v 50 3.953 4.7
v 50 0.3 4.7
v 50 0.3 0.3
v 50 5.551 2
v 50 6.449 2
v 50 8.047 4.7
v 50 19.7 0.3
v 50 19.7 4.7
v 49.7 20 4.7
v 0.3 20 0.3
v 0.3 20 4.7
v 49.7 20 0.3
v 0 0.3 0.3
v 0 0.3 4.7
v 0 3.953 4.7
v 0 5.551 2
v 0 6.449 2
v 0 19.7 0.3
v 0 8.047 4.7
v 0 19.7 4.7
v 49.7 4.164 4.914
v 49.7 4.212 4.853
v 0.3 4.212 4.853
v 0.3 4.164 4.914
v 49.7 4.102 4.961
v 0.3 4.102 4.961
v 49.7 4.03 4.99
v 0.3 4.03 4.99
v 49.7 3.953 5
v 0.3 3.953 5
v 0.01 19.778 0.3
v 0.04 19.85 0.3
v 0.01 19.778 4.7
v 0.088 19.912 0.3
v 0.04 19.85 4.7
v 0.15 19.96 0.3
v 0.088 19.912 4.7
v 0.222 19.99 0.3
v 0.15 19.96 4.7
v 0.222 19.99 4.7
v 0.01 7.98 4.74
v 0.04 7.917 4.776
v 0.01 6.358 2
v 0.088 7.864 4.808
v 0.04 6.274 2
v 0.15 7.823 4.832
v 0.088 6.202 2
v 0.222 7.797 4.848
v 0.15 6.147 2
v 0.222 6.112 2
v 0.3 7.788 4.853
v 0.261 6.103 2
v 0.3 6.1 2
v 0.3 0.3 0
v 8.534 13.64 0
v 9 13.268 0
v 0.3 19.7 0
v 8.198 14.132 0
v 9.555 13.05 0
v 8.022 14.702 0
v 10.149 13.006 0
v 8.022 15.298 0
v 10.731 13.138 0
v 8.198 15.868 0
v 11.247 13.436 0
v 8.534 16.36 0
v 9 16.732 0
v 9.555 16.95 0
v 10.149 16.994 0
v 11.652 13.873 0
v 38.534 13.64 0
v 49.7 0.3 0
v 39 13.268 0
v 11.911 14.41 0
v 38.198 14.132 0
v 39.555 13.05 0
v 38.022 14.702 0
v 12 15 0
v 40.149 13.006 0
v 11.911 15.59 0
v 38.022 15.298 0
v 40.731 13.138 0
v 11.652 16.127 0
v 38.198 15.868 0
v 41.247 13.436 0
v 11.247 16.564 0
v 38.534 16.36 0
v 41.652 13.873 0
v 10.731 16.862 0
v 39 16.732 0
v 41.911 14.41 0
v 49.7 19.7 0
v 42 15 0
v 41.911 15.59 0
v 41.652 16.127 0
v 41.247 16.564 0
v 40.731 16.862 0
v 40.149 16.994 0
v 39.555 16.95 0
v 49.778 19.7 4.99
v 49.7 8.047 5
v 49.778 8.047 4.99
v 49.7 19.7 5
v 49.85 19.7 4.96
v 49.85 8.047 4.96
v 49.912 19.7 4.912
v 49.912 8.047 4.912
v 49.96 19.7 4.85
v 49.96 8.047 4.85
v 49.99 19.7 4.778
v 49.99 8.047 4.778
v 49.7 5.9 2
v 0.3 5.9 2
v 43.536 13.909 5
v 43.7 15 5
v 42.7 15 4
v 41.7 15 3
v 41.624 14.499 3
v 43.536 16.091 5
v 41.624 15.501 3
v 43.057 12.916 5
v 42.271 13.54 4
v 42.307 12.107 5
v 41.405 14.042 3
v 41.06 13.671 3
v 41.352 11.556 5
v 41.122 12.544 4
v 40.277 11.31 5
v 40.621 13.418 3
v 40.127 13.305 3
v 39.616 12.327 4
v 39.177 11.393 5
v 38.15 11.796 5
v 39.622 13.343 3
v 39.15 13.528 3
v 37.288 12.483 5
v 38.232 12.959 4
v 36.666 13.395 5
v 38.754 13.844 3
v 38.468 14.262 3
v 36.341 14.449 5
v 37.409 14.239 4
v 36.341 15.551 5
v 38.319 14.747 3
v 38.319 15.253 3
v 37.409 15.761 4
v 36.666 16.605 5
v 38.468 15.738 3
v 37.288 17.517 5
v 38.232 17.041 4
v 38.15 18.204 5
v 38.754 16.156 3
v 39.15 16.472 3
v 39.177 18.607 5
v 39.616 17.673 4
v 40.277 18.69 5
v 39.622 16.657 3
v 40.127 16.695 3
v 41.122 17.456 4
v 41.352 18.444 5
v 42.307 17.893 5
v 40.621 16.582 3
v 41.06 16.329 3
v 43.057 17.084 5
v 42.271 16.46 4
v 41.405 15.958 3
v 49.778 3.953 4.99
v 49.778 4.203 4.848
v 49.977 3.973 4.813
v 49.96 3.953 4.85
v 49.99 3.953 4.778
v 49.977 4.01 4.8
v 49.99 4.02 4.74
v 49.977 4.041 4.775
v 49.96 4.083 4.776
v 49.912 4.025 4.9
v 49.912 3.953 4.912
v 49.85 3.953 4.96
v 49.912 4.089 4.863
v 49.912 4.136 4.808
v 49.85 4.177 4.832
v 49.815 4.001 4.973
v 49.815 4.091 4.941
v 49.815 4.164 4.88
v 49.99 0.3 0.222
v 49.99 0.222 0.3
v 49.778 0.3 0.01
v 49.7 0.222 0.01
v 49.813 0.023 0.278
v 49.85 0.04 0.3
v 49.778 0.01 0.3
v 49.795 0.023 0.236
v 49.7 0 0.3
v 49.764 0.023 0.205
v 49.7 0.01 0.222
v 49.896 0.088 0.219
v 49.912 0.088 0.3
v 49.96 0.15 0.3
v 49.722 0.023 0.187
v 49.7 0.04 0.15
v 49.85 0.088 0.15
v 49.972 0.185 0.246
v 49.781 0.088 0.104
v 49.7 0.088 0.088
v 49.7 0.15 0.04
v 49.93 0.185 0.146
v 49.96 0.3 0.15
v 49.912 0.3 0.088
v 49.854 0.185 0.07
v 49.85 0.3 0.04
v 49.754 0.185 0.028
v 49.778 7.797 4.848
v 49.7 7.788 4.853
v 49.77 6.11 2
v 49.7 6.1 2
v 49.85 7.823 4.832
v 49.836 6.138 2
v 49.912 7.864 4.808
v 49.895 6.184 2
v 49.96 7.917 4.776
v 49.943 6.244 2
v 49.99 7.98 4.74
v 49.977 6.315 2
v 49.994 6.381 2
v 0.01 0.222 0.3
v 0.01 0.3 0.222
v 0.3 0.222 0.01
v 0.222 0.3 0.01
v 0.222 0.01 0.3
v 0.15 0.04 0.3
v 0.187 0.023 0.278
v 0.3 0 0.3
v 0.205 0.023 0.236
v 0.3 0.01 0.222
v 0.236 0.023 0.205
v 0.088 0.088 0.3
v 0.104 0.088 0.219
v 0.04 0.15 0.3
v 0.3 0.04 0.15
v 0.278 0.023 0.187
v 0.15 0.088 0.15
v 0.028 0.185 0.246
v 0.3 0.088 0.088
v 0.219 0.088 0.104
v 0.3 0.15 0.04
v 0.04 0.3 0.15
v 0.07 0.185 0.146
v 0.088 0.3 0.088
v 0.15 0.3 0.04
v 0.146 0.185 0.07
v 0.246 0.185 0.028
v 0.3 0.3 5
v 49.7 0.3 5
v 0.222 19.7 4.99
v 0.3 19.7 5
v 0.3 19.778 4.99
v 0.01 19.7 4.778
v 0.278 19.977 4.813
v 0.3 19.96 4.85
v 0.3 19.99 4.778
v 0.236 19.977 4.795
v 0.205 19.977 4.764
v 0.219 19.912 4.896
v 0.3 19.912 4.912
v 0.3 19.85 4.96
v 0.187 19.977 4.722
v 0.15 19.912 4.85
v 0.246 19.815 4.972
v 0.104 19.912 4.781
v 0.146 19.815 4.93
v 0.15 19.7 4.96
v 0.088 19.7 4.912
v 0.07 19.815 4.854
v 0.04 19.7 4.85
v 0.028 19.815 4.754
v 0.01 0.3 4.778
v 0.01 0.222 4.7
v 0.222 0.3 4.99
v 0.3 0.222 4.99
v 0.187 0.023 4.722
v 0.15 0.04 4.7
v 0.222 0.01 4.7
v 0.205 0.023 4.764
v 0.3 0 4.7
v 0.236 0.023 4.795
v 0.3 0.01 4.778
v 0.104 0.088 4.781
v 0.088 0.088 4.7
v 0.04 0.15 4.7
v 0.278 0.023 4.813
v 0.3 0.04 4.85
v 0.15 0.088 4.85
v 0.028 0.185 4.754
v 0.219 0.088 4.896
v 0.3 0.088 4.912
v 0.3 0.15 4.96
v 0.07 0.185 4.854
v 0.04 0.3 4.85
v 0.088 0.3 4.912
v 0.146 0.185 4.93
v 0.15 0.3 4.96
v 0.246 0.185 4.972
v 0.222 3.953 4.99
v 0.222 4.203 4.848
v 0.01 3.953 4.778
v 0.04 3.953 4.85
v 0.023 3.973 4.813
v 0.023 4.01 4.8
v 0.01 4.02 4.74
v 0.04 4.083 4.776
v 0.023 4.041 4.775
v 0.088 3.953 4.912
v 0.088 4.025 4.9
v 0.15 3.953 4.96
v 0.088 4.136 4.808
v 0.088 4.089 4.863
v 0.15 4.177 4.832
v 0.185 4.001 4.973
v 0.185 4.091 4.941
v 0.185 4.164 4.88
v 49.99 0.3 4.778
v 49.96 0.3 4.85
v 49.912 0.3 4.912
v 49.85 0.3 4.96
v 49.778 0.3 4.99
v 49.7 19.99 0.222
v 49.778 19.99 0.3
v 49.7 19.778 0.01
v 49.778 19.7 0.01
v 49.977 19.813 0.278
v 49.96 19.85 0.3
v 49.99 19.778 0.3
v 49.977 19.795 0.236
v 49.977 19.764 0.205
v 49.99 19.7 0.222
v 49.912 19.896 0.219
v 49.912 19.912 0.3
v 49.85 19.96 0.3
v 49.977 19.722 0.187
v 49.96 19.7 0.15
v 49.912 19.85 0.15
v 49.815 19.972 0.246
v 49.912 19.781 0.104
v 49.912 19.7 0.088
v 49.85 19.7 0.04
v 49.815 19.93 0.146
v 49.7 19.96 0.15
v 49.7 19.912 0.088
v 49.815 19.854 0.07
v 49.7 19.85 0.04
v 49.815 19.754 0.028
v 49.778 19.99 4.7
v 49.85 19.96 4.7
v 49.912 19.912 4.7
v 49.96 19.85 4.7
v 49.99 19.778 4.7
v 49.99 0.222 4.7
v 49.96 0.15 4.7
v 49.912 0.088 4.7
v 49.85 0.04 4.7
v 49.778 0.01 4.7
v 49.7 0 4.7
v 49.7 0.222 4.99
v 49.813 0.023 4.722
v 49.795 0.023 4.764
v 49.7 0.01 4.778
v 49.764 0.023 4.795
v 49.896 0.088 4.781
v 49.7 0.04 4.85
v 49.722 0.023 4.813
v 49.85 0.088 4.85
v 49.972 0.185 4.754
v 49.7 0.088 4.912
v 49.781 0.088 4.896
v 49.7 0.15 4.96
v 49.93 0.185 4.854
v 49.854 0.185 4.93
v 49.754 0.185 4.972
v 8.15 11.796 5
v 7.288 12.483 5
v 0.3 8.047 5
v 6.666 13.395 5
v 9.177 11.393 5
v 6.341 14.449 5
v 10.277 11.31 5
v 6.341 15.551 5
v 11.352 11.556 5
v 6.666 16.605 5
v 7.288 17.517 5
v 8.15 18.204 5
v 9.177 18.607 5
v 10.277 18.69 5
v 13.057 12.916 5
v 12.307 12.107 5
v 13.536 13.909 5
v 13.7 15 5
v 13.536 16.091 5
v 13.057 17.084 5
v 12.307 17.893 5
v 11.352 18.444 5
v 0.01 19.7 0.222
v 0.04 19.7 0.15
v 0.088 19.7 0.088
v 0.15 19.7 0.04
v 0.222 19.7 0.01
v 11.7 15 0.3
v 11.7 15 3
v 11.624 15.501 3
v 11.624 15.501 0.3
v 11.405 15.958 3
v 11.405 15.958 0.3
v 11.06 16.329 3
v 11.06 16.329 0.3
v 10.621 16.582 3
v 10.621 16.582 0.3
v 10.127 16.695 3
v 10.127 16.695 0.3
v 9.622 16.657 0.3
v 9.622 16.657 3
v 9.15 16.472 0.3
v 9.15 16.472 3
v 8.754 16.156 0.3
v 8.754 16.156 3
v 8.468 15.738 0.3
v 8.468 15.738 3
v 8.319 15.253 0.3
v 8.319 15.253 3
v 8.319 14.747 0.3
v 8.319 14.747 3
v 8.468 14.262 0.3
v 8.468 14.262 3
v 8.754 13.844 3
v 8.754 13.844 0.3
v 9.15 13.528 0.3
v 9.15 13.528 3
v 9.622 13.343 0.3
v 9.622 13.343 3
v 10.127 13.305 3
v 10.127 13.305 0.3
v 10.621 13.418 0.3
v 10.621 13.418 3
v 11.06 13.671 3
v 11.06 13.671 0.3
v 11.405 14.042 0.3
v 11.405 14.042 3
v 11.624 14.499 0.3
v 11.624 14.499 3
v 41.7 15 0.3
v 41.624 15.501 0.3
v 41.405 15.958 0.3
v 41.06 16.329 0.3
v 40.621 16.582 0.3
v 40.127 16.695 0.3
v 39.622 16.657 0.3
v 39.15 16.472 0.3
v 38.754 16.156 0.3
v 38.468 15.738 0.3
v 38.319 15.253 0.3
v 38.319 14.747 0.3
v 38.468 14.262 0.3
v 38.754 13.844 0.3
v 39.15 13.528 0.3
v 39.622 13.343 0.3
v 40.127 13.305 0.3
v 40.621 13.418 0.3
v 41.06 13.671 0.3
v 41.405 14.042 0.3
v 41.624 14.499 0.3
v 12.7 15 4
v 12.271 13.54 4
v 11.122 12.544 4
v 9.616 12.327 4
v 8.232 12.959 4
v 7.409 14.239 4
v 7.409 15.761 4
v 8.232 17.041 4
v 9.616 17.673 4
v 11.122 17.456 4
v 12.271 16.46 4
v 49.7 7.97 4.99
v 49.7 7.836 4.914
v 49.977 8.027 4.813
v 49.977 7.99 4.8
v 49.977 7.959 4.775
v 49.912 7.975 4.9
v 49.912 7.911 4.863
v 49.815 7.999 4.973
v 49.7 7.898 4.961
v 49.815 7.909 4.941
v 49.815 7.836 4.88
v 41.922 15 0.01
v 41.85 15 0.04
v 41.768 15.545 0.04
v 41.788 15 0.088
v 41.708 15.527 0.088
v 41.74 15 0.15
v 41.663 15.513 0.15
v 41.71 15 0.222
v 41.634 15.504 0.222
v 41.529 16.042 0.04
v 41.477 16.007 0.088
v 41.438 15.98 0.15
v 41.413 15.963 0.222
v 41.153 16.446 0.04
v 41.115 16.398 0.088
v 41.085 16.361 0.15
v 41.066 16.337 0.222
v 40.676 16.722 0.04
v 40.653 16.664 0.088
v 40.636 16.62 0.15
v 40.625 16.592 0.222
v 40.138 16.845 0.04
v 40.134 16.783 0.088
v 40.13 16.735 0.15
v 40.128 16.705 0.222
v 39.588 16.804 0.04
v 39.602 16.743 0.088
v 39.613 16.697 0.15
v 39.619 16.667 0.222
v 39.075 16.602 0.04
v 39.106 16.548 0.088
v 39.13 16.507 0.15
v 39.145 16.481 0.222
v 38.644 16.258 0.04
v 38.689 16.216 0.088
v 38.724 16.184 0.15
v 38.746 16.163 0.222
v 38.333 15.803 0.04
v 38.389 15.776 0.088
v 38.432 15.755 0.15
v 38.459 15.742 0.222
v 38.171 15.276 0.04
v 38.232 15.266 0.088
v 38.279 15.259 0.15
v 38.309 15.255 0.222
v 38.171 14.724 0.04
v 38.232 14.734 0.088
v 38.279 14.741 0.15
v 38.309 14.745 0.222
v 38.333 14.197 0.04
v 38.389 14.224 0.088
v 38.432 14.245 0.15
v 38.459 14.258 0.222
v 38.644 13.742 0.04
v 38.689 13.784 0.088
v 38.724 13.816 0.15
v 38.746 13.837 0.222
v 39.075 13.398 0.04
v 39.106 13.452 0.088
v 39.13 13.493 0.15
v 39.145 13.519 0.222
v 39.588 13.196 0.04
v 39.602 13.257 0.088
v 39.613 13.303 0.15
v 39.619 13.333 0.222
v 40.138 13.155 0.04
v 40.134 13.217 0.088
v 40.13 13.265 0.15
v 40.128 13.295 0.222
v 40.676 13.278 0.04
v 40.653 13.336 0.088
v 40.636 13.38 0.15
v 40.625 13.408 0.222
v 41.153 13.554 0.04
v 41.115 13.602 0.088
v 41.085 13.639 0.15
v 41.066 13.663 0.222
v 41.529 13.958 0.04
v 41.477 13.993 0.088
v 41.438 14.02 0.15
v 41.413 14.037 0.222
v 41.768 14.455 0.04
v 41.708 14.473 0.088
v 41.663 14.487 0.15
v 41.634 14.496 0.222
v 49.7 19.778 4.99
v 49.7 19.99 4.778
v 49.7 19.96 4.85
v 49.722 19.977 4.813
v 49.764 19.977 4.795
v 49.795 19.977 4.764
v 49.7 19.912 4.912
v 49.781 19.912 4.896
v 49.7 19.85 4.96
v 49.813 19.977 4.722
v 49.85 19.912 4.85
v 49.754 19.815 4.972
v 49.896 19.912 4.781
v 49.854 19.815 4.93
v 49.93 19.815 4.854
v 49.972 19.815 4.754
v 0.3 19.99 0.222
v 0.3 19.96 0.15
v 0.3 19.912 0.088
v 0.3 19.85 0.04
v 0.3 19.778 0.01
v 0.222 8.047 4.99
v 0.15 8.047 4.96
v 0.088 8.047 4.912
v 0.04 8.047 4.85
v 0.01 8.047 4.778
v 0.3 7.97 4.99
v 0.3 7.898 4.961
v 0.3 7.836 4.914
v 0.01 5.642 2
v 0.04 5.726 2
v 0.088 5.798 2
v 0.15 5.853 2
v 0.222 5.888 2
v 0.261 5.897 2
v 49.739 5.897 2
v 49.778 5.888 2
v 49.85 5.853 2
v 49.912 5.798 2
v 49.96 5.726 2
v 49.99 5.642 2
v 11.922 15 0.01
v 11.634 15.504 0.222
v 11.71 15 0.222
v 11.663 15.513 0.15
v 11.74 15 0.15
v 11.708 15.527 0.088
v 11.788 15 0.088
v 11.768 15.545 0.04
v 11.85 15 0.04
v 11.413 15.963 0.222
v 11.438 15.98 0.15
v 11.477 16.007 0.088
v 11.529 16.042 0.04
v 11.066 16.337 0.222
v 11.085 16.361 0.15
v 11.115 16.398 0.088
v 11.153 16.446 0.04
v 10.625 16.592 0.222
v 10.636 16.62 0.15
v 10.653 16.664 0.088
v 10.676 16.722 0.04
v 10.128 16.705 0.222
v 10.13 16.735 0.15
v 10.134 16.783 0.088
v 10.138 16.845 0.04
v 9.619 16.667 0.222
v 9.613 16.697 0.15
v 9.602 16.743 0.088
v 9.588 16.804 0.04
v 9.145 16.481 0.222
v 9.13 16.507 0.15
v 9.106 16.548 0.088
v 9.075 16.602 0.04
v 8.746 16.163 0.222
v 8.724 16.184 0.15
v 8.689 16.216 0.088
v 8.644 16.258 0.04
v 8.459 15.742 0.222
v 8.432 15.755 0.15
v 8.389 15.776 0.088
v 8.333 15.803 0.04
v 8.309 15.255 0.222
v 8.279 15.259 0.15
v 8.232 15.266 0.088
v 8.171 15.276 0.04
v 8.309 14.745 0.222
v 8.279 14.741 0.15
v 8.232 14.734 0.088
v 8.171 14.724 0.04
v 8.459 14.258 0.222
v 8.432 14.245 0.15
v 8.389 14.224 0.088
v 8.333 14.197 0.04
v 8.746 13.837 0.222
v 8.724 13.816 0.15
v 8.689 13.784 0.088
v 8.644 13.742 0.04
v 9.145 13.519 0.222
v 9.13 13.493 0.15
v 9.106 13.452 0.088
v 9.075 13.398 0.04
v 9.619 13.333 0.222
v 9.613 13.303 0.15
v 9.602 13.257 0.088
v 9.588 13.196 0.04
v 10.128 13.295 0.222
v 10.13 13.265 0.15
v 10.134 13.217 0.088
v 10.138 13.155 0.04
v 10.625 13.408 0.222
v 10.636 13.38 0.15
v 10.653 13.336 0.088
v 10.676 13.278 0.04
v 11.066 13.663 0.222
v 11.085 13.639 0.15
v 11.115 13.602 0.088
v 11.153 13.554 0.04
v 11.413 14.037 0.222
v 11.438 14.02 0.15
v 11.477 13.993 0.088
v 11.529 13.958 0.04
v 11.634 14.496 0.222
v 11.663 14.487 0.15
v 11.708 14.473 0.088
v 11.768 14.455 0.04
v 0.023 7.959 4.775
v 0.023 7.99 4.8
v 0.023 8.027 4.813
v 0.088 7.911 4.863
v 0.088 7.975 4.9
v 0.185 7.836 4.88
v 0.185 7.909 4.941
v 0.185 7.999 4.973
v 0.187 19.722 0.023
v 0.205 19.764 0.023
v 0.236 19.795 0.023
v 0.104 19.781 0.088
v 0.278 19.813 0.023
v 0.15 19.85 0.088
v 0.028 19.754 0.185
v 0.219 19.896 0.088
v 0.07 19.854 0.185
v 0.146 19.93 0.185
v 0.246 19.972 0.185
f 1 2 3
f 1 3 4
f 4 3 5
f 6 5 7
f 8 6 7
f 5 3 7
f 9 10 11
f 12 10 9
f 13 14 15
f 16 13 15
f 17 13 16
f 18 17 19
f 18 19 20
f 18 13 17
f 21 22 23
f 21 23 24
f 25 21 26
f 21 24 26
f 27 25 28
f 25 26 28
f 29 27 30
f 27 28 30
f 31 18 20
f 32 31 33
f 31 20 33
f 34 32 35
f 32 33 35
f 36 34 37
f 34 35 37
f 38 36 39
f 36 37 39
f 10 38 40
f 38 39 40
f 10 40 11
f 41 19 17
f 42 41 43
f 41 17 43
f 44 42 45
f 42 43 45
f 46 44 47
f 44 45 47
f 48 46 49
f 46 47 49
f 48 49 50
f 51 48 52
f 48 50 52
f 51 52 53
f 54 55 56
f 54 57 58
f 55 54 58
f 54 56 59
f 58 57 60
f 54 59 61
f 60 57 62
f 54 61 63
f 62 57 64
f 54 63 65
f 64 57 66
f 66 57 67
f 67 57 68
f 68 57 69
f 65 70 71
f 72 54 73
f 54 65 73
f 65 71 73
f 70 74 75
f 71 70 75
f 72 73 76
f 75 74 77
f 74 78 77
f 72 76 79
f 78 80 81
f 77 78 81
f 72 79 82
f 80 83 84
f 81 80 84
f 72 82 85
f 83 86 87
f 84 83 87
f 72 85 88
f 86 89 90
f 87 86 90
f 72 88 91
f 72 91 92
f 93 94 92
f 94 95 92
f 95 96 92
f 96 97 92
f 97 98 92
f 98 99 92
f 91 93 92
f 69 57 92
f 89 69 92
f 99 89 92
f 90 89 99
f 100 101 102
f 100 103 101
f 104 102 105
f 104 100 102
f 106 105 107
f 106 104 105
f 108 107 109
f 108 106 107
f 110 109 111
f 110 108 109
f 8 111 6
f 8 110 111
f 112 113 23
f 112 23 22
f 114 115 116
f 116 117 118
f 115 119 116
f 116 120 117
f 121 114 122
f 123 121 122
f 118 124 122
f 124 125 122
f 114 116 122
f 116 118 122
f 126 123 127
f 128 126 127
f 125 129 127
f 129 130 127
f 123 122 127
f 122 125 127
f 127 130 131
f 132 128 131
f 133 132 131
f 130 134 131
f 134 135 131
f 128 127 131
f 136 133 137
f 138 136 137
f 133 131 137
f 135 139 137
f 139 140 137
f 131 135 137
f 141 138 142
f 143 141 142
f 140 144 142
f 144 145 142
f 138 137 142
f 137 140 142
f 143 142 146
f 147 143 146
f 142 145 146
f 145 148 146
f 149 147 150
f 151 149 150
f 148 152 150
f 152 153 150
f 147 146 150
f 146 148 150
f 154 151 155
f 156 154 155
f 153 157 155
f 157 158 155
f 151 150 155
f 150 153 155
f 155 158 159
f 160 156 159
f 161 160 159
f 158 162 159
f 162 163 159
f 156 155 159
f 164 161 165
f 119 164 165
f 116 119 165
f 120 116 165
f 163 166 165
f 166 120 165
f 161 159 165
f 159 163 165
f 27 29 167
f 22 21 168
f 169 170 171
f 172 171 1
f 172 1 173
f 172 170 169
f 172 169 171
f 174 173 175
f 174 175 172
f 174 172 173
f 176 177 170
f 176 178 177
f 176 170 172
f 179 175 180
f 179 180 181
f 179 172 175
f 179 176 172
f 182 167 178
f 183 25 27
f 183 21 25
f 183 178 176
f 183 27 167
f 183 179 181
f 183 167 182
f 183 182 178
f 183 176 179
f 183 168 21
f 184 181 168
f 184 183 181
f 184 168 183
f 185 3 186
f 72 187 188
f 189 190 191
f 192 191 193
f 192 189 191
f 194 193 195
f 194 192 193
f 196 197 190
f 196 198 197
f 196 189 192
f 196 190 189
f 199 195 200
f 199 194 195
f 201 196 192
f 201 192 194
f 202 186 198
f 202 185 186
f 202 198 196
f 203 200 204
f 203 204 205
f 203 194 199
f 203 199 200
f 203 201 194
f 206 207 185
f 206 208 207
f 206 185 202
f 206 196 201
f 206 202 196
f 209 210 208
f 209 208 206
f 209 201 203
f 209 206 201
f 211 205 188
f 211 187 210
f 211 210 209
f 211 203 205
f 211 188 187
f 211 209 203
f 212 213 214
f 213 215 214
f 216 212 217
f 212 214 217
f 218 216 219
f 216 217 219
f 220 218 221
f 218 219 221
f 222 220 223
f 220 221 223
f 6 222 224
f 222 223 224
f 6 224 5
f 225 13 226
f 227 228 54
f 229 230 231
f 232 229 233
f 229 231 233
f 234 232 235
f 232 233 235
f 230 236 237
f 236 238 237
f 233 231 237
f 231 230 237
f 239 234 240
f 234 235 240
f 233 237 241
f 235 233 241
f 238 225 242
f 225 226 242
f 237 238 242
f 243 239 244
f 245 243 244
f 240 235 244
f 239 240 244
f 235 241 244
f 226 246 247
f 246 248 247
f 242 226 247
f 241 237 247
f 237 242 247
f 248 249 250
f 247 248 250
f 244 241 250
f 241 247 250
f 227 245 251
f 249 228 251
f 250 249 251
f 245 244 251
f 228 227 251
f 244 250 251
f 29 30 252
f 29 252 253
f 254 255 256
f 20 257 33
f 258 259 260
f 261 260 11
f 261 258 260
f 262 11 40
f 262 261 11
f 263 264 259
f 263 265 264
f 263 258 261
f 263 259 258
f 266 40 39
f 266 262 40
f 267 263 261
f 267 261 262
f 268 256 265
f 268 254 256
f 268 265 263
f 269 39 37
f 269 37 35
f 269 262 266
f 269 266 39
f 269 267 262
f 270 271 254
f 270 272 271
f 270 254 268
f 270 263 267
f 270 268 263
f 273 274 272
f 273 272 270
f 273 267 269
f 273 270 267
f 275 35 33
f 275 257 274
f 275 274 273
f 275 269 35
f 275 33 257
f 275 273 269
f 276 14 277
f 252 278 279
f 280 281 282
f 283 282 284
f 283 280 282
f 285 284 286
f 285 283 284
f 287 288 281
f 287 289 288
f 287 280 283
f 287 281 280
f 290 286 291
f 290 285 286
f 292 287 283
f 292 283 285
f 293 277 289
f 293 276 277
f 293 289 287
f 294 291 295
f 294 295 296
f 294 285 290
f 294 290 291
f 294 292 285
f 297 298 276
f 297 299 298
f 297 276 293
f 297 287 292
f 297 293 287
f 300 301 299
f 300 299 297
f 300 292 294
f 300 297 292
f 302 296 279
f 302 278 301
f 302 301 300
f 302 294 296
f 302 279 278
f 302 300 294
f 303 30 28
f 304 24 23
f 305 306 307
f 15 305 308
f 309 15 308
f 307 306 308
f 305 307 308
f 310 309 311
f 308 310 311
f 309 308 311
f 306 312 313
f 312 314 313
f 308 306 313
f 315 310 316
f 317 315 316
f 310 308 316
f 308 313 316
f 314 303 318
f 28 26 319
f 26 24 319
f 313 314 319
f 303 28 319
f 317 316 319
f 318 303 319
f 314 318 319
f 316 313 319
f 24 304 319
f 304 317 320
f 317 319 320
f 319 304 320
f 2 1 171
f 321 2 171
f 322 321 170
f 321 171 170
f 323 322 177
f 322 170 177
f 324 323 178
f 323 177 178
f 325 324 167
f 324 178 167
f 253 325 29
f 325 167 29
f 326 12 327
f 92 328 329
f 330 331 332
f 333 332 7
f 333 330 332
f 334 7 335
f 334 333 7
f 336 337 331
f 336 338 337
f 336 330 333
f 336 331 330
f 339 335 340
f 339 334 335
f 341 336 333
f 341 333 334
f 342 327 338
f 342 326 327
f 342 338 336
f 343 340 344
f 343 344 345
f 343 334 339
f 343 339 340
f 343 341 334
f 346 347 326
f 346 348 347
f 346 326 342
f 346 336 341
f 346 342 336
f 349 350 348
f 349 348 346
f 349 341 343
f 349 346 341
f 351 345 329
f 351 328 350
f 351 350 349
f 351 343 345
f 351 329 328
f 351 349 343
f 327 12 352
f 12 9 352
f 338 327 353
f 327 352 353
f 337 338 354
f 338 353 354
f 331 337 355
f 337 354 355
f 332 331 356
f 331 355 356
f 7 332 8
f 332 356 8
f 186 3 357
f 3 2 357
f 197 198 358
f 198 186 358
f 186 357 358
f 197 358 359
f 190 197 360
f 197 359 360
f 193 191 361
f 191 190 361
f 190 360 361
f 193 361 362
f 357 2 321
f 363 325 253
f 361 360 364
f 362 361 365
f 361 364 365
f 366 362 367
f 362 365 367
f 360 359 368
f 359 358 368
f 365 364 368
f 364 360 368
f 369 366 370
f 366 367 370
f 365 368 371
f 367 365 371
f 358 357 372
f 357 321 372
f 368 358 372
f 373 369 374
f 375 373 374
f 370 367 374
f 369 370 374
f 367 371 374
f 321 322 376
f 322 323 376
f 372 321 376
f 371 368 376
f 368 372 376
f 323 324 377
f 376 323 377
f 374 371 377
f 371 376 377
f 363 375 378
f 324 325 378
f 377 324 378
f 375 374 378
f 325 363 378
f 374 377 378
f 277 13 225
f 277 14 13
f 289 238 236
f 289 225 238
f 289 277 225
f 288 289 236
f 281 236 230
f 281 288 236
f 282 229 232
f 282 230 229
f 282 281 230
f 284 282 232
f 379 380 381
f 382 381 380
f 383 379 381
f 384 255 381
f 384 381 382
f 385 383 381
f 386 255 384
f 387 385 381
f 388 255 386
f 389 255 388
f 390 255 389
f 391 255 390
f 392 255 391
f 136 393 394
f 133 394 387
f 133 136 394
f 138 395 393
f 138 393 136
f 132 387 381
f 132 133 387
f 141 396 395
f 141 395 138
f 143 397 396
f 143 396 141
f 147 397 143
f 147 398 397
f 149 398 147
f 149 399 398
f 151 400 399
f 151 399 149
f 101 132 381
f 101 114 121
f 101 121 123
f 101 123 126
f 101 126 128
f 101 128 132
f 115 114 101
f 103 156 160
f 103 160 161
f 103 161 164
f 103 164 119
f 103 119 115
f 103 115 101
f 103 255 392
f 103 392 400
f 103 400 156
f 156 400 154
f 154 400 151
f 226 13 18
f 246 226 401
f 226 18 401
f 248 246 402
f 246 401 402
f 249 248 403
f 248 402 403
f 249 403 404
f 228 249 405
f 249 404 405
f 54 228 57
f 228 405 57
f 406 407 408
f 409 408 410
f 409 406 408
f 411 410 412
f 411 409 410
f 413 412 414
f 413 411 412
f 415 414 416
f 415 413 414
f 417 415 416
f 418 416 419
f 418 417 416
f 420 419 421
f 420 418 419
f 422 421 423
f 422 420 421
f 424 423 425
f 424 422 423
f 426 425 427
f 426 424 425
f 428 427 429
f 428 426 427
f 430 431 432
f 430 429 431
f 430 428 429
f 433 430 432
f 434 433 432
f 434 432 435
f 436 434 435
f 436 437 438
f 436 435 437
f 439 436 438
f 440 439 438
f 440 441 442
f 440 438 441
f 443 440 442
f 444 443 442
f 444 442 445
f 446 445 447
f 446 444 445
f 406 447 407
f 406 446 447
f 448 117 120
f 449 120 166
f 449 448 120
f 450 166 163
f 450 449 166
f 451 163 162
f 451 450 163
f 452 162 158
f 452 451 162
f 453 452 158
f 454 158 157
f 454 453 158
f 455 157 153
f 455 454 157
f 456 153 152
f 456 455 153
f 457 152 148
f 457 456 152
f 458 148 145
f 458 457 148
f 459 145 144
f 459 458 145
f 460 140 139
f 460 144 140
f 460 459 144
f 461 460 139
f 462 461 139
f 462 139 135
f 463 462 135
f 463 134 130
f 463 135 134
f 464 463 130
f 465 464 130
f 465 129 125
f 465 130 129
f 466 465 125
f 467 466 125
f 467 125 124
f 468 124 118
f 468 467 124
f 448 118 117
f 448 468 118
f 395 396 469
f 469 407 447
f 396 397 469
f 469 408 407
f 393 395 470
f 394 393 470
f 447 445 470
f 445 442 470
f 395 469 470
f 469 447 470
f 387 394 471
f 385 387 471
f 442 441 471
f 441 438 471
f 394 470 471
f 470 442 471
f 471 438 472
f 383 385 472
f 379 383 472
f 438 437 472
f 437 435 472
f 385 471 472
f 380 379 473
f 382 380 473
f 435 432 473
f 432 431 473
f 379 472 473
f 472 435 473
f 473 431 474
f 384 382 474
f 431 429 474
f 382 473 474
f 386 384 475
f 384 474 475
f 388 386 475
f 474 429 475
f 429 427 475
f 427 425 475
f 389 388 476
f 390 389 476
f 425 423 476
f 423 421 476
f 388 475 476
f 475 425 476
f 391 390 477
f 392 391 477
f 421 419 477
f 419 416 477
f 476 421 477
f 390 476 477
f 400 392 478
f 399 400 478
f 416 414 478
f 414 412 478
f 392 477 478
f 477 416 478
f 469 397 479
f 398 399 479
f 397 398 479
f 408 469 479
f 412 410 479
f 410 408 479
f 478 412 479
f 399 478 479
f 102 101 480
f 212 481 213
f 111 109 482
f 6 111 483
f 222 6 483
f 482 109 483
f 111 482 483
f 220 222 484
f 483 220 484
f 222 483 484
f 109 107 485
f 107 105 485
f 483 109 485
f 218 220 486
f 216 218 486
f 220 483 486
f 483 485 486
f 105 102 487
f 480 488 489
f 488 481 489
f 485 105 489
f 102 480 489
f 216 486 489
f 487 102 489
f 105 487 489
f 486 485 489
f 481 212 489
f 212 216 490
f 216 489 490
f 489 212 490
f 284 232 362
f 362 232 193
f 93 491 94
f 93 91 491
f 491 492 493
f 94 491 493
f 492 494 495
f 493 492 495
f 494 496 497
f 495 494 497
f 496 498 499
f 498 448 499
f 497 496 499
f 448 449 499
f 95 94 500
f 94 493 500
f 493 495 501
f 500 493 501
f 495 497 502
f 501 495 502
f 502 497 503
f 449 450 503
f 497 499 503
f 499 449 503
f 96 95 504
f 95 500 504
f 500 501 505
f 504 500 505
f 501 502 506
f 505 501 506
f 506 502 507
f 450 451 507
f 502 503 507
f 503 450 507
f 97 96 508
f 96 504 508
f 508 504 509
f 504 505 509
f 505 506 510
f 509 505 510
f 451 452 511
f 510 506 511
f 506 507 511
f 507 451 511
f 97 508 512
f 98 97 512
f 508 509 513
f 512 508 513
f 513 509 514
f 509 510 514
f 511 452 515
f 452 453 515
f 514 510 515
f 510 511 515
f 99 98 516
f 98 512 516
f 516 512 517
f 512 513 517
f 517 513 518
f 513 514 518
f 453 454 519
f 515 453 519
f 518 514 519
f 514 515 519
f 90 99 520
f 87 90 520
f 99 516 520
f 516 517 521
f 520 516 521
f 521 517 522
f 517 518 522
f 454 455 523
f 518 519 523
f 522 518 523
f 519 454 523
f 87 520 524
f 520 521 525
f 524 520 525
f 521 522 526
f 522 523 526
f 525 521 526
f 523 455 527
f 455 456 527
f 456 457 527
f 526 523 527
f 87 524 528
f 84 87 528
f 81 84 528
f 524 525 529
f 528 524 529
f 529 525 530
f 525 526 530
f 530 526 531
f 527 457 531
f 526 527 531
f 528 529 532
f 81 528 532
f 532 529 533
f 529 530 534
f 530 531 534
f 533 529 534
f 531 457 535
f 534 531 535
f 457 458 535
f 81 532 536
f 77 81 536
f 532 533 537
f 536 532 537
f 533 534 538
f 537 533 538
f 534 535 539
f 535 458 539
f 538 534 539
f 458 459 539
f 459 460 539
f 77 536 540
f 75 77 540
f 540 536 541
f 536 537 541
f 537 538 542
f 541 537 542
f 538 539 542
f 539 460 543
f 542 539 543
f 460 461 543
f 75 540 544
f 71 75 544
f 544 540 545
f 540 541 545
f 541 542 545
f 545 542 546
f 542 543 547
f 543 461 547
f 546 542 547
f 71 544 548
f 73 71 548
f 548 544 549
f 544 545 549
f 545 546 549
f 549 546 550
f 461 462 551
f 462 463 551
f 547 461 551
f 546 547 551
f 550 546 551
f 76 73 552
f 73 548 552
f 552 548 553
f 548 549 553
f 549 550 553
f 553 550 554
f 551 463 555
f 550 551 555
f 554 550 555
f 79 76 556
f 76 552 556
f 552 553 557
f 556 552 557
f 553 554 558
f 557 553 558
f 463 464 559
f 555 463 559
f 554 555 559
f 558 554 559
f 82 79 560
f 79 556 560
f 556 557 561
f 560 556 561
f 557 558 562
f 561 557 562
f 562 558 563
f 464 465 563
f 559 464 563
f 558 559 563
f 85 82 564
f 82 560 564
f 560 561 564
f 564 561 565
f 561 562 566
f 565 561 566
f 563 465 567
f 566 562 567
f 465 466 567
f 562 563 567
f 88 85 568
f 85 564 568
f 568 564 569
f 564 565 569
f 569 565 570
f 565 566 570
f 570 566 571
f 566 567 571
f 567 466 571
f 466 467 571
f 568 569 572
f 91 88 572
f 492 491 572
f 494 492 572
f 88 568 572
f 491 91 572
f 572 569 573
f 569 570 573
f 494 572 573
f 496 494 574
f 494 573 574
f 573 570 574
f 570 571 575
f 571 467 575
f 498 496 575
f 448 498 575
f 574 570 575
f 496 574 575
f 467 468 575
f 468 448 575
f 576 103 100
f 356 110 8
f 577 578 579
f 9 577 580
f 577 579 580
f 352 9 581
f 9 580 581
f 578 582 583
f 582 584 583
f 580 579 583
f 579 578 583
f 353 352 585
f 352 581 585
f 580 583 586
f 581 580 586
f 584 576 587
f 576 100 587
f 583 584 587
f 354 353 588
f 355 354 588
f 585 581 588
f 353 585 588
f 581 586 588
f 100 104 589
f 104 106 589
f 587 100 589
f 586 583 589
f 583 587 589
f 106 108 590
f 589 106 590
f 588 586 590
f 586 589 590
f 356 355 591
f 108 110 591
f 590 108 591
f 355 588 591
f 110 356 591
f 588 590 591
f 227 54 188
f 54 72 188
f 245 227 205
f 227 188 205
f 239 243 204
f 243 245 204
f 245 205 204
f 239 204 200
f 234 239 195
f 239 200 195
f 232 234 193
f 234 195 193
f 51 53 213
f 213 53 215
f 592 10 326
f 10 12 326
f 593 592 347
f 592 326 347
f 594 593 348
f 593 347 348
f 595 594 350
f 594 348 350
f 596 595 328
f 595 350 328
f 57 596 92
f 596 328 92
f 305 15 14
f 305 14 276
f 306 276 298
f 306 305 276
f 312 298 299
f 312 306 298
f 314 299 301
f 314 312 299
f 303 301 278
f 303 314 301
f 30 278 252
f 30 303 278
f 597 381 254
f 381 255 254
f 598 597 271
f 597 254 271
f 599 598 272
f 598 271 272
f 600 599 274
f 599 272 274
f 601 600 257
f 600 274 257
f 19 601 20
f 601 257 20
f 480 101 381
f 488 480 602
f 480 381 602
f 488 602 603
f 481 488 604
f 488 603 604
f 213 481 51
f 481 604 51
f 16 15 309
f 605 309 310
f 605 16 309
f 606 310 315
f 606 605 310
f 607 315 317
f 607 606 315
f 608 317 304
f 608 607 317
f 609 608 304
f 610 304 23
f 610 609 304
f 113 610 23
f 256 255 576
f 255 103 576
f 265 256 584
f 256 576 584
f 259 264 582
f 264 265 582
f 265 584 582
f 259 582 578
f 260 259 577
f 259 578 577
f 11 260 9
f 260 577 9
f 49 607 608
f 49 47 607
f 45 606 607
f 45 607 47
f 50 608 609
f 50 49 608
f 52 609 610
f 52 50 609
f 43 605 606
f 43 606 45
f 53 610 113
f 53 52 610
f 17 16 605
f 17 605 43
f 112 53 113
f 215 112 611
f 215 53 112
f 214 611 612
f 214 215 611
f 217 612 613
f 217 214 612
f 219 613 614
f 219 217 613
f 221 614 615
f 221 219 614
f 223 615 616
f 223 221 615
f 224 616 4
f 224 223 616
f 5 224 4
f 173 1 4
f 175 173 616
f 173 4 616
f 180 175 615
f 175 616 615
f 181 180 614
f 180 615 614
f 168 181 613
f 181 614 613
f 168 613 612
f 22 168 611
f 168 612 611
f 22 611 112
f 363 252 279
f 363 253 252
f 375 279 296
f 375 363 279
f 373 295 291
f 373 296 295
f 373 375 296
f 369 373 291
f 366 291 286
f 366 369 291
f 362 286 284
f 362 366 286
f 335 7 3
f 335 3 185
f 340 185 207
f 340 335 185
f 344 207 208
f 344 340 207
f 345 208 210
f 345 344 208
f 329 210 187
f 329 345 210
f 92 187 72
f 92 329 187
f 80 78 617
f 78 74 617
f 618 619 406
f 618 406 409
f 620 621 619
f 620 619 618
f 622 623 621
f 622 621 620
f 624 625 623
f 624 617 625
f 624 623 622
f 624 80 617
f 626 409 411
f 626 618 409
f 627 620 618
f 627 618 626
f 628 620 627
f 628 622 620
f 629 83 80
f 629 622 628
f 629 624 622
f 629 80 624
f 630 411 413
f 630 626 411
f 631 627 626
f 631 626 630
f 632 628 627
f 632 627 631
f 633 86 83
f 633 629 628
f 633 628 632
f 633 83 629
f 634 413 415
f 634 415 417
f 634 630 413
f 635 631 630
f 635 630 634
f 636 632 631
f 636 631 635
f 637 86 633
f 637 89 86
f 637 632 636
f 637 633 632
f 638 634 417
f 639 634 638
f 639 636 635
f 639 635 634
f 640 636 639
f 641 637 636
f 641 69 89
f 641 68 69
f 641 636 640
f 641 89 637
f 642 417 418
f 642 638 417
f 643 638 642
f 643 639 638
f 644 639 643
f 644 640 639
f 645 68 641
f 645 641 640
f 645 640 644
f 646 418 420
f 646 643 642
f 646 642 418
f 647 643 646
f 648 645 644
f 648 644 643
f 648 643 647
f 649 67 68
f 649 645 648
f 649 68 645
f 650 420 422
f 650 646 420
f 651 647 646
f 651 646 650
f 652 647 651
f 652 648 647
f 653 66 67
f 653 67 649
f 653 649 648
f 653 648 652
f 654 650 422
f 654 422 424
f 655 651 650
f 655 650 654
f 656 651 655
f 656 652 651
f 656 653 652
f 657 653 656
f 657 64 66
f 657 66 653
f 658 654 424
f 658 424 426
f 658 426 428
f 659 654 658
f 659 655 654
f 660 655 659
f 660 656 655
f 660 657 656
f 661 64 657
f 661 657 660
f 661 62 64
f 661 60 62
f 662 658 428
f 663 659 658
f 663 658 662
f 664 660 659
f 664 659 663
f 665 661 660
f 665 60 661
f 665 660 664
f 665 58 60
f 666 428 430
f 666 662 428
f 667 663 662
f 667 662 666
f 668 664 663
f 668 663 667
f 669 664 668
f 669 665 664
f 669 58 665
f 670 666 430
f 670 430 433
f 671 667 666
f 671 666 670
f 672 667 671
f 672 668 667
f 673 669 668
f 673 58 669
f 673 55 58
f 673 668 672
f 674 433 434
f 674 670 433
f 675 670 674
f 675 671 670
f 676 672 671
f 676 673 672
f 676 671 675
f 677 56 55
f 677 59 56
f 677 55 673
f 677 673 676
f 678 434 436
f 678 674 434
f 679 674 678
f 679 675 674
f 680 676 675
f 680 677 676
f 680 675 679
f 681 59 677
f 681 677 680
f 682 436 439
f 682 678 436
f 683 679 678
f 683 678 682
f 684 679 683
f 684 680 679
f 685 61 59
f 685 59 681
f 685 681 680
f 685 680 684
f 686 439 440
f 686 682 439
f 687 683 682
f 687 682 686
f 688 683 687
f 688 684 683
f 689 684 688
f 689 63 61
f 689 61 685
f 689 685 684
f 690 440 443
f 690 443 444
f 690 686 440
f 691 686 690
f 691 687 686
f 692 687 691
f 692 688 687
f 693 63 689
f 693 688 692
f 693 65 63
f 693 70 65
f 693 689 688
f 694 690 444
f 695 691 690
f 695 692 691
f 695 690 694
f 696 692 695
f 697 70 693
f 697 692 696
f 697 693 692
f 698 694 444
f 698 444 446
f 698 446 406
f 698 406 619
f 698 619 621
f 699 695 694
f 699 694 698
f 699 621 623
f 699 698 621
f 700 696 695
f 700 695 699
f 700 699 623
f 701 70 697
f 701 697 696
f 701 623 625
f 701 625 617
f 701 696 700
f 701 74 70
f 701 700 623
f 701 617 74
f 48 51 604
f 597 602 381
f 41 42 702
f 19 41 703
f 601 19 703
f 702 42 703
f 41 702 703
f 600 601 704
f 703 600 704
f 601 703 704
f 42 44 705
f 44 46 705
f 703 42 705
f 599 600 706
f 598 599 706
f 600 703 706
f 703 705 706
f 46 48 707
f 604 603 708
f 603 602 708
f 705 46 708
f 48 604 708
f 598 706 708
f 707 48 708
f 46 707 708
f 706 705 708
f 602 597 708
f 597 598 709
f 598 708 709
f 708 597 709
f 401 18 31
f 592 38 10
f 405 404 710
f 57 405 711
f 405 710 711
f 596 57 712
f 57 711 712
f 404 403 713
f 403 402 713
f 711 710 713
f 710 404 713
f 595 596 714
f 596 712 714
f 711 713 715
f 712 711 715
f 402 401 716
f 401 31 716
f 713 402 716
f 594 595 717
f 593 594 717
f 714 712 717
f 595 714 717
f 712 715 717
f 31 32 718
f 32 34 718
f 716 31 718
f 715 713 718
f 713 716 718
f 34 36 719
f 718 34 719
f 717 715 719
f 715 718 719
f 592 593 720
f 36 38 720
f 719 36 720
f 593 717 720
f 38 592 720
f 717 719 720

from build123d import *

# Parameters (mm, degrees)
CYLINDER_R        = 1.7
CYLINDER_DEPTH    = 10
CYLINDER001_R     = 1.7
CYLINDER001_DEPTH = 10
BOX_W             = 50
BOX_H             = 6
BOX_DEPTH         = 5
CHAMFER_1_SIZE2   = 2.9
CHAMFER_1_SIZE    = 4.9
CHAMFER_2_SIZE2   = 2.9
CHAMFER_2_SIZE    = 4.9
BOX001_W          = 50
BOX001_H          = 20
BOX001_DEPTH      = 5
CHAMFER001_SIZE   = 2
FILLET_R          = 0.3


with BuildPart() as cylinder:
    # Cylinder → Cylinder (new body)
    with BuildSketch(Plane(origin=(10, 15, 0), x_dir=(1, 0, 0), z_dir=(0, 0, 1))):
        Circle(CYLINDER_R)
    extrude(amount=CYLINDER_DEPTH)


with BuildPart() as cylinder001:
    # Cylinder001 → Cylinder001 (new body)
    with BuildSketch(Plane(origin=(40, 15, 0), x_dir=(1, 0, 0), z_dir=(0, 0, 1))):
        Circle(CYLINDER001_R)
    extrude(amount=CYLINDER001_DEPTH)


with BuildPart() as chamfer_body:
    # Box → Box (new body)
    with BuildSketch(Plane.XY.offset(2)):
        with Locations((25, 3)):
            Rectangle(BOX_W, BOX_H)
    extrude(amount=BOX_DEPTH)

    # Chamfer 1
    chamfer_1_edges = [chamfer_body.edges().sort_by_distance(p)[0] for p in [
        (25, 6, 2),
    ]]
    chamfer_1_side = chamfer_body.faces().sort_by_distance((25, 6, 4.5))[0]
    chamfer(chamfer_1_edges, length=CHAMFER_1_SIZE, length2=CHAMFER_1_SIZE2, reference=chamfer_1_side)

    # Chamfer 2
    chamfer_2_edges = [chamfer_body.edges().sort_by_distance(p)[0] for p in [
        (25, 0, 2),
    ]]
    chamfer_2_side = chamfer_body.faces().sort_by_distance((25, 0, 4.5))[0]
    chamfer(chamfer_2_edges, length=CHAMFER_2_SIZE, length2=CHAMFER_2_SIZE2, reference=chamfer_2_side)


with BuildPart() as chamfer_body_1:
    # Chamfer placement: moved
    add(chamfer_body.part.moved(Location((0, 3, 0))))


with BuildPart() as fillet_body:
    # Box001 → Box001 (new body)
    with BuildSketch(Plane.XY):
        with Locations((25, 10)):
            Rectangle(BOX001_W, BOX001_H)
    extrude(amount=BOX001_DEPTH)

    # Cut: cut Chamfer body
    add(chamfer_body_1.part, mode=Mode.SUBTRACT)

    # Cut001: cut Cylinder001
    add(cylinder001.part, mode=Mode.SUBTRACT)

    # Cut002: cut Cylinder
    add(cylinder.part, mode=Mode.SUBTRACT)

    # Chamfer001
    chamfer001_edges = [fillet_body.edges().sort_by_distance(p)[0] for p in [
        (8.3, 15, 5),
        (38.3, 15, 5),
    ]]
    chamfer(chamfer001_edges, length=CHAMFER001_SIZE)

    # Fillet
    fillet_edges = [fillet_body.edges().sort_by_distance(p)[0] for p in [
        (0, 13.937755, 5),
        (25, 7.87551, 5),
        (50, 13.937755, 5),
        (25, 20, 5),
        (0, 2.062245, 5),
        (0, 5.012245, 3.5),
        (0, 6.987755, 3.5),
        (0, 20, 2.5),
        (0, 10, 0),
        (0, 0, 2.5),
        (50, 6.987755, 3.5),
        (25, 20, 0),
        (50, 20, 2.5),
        (50, 2.062245, 5),
        (50, 5.012245, 3.5),
        (50, 10, 0),
        (50, 0, 2.5),
        (8.3, 15, 0),
        (25, 4.12449, 5),
        (25, 0, 5),
        (25, 0, 0),
        (38.3, 15, 0),
    ]]
    fillet(fillet_edges, radius=FILLET_R)


solid = fillet_body.part
